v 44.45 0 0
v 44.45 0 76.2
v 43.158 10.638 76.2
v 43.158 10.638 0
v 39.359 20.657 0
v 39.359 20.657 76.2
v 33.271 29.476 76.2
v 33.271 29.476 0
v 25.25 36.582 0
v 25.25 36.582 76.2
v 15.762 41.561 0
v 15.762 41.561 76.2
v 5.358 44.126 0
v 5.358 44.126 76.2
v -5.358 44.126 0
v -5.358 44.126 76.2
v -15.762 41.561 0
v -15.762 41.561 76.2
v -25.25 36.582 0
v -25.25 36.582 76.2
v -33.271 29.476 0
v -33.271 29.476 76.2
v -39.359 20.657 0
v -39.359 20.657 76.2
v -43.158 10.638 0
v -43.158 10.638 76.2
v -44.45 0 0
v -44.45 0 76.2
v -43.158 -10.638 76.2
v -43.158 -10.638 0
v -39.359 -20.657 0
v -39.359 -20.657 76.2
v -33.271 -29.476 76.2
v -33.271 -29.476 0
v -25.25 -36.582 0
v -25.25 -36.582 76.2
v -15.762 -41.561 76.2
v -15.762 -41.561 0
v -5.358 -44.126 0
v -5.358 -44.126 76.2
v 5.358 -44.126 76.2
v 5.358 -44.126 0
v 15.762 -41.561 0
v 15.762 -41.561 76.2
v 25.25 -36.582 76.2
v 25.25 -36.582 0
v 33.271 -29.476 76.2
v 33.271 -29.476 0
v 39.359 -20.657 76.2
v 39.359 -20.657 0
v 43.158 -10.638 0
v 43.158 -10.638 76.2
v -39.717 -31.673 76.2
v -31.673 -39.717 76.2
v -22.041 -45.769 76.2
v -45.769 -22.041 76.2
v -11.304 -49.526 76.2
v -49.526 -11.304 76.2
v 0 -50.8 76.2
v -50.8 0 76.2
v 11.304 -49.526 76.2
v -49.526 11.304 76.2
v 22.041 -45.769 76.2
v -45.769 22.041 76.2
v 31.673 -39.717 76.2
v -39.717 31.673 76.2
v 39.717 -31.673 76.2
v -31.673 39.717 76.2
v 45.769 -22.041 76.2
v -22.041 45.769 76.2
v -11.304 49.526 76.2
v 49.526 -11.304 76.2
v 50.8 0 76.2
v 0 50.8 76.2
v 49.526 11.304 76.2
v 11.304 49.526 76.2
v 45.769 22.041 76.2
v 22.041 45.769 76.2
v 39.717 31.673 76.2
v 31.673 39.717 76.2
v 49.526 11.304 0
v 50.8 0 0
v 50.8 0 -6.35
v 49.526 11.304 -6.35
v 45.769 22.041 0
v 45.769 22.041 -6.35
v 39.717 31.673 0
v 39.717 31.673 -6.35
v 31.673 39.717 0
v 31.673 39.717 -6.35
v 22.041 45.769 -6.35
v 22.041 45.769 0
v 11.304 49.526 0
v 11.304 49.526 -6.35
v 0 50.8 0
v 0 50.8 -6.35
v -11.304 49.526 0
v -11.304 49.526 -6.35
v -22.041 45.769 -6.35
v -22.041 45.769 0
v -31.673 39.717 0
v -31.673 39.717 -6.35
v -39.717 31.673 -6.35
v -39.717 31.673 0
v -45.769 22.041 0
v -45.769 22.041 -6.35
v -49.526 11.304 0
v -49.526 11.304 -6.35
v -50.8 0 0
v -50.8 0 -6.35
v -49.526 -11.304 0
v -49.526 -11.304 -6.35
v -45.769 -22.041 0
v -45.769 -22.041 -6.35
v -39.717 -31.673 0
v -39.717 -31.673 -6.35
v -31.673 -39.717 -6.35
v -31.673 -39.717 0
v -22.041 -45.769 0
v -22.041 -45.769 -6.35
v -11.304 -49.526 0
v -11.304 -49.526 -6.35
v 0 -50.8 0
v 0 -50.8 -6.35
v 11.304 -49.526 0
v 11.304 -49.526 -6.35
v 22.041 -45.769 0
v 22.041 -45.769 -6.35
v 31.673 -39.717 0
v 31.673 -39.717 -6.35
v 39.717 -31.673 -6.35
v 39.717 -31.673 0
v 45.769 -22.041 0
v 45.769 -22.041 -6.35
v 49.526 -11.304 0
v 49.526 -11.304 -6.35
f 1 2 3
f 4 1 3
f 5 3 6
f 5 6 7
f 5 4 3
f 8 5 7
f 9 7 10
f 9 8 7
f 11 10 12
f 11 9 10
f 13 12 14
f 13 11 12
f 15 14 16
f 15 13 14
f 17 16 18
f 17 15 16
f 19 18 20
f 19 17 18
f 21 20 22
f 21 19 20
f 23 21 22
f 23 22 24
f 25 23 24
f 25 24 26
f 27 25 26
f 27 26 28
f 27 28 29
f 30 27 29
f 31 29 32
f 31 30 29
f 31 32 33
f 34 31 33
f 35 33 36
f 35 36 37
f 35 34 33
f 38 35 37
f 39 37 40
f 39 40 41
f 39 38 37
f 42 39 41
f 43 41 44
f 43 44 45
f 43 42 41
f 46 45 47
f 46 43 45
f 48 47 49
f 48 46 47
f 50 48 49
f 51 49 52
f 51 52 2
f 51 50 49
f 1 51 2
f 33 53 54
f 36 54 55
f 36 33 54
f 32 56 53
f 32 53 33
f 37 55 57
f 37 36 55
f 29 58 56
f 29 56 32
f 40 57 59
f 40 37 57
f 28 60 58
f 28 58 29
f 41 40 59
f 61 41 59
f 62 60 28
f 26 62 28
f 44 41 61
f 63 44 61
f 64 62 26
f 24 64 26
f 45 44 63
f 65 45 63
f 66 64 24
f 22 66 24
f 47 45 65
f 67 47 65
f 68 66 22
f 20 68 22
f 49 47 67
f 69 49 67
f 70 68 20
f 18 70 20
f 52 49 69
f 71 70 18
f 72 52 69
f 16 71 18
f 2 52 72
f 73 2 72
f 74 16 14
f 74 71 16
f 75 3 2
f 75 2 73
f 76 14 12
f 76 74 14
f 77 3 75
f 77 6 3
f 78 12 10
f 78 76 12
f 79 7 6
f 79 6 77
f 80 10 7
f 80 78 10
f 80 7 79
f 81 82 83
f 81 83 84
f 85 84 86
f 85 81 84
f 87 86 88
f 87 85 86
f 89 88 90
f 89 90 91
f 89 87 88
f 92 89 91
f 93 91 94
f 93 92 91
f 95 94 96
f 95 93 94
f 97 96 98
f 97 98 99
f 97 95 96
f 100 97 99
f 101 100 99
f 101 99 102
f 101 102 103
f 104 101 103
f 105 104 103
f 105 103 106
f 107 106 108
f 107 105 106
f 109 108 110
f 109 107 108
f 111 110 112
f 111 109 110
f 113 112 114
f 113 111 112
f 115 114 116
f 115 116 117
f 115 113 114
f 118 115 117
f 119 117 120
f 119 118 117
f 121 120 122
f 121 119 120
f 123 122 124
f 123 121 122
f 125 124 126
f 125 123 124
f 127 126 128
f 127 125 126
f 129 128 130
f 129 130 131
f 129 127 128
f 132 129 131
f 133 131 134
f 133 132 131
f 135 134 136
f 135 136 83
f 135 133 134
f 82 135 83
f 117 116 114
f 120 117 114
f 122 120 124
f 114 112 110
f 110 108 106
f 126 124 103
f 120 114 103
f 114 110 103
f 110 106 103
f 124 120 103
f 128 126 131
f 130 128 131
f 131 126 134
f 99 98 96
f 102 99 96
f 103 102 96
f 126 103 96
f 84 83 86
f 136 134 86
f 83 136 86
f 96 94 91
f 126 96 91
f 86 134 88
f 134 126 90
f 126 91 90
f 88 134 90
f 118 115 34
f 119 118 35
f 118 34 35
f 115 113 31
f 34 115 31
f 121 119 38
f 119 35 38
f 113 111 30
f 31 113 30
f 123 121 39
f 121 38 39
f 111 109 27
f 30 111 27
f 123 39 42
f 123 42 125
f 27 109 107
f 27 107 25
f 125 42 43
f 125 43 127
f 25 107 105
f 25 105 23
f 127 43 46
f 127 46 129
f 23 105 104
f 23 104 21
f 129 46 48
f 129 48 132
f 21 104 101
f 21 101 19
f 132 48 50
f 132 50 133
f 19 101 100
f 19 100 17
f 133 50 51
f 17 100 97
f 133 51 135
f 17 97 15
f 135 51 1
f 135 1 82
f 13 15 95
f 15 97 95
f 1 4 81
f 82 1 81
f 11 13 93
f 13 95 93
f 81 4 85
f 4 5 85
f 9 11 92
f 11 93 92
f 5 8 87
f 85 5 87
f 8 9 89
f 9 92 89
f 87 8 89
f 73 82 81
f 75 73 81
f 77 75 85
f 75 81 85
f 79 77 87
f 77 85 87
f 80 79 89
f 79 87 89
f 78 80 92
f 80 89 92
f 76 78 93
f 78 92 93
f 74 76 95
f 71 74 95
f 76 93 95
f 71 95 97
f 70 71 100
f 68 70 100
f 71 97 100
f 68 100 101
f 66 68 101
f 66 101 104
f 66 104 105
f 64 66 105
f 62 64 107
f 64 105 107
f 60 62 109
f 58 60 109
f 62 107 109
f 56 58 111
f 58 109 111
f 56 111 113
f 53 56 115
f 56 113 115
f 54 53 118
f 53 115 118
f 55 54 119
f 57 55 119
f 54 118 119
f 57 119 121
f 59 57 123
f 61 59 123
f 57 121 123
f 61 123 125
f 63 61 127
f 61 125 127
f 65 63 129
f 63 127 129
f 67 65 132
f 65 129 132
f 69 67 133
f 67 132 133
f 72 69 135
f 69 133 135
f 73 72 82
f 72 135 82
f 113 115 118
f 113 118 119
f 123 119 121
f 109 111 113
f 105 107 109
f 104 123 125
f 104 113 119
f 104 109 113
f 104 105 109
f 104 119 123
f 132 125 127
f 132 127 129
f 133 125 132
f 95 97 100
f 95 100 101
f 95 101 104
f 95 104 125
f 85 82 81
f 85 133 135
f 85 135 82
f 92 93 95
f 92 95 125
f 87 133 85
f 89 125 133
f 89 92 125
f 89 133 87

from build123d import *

# Parameters (mm, degrees)
F0_R     = 50.8
F0_R_2   = 44.45
F1_DEPTH = 76.2
F2_R     = 50.8
F3_DEPTH = 6.35


with BuildPart() as f1:
    # F0 (on Top) → F1 (new body)
    with BuildSketch(Plane.XY):
        Circle(F0_R)
        Circle(F0_R_2, mode=Mode.SUBTRACT)
    extrude(amount=F1_DEPTH)


with BuildPart() as f3:
    # F2 (on Top) → F3 (new body)
    with BuildSketch(Plane.XY):
        Circle(F2_R)
    extrude(amount=-F3_DEPTH)


solid = Compound([f1.part, f3.part])
